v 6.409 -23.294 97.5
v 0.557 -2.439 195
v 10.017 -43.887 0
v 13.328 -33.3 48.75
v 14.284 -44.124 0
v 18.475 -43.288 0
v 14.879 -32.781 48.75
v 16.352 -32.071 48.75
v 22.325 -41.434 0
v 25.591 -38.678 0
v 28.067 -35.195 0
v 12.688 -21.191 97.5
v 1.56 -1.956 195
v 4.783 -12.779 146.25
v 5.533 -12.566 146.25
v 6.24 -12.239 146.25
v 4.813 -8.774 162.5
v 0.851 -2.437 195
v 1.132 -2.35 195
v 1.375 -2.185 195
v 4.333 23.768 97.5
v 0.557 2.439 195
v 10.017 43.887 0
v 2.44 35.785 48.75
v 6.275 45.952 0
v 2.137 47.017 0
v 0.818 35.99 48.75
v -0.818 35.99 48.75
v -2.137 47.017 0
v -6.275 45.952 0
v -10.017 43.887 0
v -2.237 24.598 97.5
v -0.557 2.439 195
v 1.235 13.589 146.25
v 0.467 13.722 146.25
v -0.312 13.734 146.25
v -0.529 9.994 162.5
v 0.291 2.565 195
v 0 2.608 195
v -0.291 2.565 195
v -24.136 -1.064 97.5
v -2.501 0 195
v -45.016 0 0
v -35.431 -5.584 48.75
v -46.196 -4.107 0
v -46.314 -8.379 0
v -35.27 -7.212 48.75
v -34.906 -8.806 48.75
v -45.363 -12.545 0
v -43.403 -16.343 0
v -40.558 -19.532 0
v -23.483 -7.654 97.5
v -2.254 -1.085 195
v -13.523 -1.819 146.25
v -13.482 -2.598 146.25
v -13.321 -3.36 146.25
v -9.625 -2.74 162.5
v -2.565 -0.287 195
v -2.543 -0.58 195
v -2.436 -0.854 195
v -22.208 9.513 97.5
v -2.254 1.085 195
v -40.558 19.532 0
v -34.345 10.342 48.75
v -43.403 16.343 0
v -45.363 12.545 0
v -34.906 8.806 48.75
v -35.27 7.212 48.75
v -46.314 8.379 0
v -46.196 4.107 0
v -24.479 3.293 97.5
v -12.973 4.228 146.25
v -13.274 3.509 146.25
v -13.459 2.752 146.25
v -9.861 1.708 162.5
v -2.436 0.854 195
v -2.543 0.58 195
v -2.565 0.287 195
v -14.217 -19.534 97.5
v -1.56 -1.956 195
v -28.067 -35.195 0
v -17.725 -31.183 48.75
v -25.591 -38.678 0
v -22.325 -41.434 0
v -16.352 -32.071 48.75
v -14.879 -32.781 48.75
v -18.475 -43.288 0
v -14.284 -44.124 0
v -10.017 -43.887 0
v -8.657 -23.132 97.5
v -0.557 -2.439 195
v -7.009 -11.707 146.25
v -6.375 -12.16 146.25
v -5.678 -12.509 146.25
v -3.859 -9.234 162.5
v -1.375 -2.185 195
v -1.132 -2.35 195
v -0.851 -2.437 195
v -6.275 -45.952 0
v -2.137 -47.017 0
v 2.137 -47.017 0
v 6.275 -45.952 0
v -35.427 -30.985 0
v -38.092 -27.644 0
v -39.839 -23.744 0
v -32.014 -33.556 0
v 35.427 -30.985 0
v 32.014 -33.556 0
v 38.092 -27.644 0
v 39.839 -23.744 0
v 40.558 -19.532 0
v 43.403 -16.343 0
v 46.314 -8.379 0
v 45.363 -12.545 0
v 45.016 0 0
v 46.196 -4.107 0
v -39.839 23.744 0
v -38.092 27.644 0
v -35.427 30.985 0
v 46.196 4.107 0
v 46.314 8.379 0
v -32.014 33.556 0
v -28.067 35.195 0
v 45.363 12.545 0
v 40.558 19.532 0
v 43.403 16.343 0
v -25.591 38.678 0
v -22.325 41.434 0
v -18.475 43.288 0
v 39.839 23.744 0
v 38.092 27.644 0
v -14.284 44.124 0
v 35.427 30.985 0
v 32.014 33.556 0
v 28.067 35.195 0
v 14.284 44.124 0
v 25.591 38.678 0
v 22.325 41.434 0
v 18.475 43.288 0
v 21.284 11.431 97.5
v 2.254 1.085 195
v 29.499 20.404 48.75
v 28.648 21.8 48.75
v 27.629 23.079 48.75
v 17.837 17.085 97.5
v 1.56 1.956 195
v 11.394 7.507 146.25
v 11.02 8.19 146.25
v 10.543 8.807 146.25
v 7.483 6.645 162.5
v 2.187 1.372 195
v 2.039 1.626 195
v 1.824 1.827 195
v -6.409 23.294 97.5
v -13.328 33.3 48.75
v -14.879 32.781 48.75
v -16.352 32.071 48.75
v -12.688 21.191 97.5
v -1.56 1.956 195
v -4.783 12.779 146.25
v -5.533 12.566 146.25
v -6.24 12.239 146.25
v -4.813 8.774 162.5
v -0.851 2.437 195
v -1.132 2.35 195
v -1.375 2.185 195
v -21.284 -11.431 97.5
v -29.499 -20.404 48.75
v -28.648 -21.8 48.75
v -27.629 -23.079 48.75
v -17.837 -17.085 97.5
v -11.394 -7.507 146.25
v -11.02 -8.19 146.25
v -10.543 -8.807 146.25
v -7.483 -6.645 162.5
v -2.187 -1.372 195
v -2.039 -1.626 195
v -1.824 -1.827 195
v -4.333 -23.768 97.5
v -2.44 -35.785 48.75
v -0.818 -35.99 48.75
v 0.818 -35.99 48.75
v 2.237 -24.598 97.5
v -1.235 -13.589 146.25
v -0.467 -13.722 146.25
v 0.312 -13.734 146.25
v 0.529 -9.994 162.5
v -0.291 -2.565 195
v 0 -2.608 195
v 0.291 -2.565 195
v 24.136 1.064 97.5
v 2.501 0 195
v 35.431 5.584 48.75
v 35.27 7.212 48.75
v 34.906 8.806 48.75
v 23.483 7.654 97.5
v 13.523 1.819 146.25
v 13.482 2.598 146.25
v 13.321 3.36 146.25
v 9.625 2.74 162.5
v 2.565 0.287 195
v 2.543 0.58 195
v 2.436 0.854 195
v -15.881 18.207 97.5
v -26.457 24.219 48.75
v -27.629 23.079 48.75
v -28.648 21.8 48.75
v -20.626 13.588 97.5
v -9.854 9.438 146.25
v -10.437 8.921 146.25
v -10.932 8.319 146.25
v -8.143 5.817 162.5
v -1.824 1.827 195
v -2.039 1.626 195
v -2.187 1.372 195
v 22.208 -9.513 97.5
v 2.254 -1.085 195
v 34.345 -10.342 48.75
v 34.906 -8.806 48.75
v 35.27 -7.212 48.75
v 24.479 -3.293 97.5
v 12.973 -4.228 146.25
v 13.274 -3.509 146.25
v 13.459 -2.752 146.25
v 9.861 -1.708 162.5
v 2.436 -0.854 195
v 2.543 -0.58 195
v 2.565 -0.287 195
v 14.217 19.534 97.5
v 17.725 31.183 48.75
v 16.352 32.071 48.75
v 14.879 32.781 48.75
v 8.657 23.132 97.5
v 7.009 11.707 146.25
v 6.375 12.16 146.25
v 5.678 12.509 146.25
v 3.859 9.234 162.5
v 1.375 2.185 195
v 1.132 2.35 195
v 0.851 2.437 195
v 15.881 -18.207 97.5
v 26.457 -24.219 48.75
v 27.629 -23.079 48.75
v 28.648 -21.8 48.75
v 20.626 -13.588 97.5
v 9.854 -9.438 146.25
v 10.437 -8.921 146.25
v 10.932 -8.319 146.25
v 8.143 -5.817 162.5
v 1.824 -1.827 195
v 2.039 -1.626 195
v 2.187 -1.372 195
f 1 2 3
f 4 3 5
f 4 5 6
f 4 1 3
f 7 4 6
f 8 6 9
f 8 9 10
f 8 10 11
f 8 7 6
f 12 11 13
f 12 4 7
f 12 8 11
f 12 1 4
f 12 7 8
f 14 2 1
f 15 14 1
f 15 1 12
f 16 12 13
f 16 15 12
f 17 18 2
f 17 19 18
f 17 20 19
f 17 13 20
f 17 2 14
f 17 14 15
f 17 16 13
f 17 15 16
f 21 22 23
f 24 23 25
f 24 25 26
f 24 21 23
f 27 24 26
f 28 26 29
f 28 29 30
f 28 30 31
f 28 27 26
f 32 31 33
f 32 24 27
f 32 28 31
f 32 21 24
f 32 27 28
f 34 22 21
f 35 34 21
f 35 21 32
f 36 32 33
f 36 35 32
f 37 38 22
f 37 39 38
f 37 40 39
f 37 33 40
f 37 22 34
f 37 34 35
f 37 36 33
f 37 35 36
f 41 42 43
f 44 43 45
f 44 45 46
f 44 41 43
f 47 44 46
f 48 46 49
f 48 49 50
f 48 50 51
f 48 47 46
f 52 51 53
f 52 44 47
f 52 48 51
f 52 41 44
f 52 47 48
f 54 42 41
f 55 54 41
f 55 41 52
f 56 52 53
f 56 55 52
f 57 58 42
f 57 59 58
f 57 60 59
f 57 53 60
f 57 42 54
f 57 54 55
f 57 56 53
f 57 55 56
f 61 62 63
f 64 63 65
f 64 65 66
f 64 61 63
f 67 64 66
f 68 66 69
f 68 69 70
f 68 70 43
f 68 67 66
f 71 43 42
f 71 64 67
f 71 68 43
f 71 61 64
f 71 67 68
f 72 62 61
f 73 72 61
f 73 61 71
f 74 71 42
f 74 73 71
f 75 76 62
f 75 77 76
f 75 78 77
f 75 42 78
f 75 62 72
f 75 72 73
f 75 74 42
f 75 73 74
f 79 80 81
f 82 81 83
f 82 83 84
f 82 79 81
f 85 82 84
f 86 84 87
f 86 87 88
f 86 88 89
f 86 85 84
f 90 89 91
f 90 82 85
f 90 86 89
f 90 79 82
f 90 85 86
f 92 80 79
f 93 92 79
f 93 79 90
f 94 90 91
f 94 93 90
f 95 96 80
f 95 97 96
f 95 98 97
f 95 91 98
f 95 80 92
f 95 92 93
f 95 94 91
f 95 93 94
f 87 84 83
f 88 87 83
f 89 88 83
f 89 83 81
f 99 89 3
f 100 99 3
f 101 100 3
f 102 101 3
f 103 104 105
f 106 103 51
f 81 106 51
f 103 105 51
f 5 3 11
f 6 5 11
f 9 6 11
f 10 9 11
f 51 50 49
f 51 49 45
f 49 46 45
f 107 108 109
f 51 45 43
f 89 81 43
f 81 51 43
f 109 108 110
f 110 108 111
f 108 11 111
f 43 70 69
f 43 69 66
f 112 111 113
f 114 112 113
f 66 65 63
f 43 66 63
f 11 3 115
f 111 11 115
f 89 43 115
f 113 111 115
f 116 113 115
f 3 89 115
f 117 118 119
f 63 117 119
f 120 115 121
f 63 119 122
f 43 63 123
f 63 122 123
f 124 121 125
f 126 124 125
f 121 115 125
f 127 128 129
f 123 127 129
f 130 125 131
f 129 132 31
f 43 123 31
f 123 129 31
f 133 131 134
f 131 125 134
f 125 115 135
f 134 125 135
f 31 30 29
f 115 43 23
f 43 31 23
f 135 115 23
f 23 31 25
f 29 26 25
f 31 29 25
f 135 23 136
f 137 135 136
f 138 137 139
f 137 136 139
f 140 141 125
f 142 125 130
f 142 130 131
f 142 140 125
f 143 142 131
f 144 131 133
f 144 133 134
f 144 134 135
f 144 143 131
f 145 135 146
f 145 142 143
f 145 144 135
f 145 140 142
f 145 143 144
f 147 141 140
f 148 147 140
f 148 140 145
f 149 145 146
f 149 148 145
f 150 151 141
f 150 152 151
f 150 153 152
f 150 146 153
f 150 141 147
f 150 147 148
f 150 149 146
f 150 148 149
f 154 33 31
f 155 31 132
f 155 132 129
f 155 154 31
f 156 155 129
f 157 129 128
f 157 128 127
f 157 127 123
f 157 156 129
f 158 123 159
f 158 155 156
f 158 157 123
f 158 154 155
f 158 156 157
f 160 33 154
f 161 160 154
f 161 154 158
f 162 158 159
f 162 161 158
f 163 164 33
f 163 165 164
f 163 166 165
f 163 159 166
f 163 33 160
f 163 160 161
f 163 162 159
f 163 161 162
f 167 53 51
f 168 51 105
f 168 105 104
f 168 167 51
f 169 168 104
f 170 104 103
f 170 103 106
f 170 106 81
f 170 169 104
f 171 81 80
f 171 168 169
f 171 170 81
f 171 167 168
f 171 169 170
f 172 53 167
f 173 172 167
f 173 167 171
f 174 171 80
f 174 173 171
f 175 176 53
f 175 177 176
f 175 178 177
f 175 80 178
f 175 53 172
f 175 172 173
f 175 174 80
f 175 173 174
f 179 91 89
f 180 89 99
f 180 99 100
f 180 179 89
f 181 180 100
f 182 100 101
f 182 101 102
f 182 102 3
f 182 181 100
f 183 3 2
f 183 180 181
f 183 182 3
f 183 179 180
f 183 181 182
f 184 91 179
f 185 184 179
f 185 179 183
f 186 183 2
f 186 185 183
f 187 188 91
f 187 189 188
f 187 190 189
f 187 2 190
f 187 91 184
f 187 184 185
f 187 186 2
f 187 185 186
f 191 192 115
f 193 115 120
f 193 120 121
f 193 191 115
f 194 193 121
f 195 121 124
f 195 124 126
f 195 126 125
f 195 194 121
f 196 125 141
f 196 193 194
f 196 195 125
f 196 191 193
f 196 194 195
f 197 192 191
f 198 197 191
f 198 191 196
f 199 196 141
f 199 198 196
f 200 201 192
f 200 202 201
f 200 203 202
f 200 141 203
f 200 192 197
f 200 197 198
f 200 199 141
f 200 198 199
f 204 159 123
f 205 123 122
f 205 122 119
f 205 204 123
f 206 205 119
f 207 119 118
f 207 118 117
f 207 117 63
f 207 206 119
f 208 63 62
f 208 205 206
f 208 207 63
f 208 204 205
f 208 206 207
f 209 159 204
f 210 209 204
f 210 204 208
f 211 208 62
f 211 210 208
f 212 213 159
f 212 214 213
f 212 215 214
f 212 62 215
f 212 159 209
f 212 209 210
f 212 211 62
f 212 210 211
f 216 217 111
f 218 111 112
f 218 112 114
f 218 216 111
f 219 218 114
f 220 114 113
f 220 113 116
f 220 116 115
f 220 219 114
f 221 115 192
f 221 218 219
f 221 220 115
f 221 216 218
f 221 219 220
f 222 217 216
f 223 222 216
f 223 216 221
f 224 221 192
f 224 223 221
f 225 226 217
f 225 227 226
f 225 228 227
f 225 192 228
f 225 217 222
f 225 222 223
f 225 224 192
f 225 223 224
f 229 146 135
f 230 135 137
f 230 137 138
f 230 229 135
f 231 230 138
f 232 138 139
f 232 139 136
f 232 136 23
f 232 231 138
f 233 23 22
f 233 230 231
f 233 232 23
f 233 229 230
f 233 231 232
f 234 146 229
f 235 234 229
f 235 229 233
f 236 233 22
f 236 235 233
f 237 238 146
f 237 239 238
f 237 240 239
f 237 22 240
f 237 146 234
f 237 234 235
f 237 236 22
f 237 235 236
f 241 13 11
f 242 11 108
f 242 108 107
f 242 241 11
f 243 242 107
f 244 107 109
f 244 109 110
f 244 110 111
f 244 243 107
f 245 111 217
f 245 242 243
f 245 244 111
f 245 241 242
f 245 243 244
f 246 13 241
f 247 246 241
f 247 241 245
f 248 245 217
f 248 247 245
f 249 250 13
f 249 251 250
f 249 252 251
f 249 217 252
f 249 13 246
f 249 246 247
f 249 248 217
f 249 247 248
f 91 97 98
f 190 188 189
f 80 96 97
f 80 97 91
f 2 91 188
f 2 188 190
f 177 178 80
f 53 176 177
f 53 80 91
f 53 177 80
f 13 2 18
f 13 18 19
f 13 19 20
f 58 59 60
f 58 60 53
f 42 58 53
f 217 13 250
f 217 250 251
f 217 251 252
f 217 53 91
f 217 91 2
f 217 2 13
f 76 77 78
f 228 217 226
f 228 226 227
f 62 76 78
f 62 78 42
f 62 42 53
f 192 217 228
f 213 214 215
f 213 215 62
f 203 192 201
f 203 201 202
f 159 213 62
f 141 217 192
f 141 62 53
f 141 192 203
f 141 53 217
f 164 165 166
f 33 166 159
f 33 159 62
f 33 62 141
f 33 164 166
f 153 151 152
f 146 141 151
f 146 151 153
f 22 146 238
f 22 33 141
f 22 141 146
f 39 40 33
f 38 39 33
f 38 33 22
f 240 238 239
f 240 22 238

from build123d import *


with BuildPart() as f3:
    # F0 (on Top) → F3 section 0
    with BuildSketch(Plane.XY):
        with BuildLine():
            ThreePointArc((28.067108, 35.195041), (20.458563, 42.482644), (10.017035, 43.887498))
            ThreePointArc((10.017035, 43.887498), (0, 47.152178), (-10.017035, 43.887498))
            ThreePointArc((-10.017035, 43.887498), (-20.458563, 42.482644), (-28.067108, 35.195041))
            ThreePointArc((-28.067108, 35.195041), (-36.865057, 29.398902), (-40.558147, 19.531774))
            ThreePointArc((-40.558147, 19.531774), (-45.969974, 10.492347), (-45.016146, 0))
            ThreePointArc((-45.016146, 0), (-45.969974, -10.492347), (-40.558147, -19.531774))
            ThreePointArc((-40.558147, -19.531774), (-36.865057, -29.398902), (-28.067108, -35.195041))
            ThreePointArc((-28.067108, -35.195041), (-20.458563, -42.482644), (-10.017035, -43.887498))
            ThreePointArc((-10.017035, -43.887498), (0, -47.152178), (10.017035, -43.887498))
            ThreePointArc((10.017035, -43.887498), (20.458563, -42.482644), (28.067108, -35.195041))
            ThreePointArc((28.067108, -35.195041), (36.865057, -29.398902), (40.558147, -19.531774))
            ThreePointArc((40.558147, -19.531774), (45.969974, -10.492347), (45.016146, 0))
            ThreePointArc((45.016146, 0), (45.969974, 10.492347), (40.558147, 19.531774))
            ThreePointArc((40.558147, 19.531774), (36.865057, 29.398902), (28.067108, 35.195041))
        make_face()
    # F2 (on offset) → F3 section 1
    with BuildSketch(Plane.XY.offset(195)):
        with BuildLine():
            ThreePointArc((1.559635, 1.95572), (1.13156, 2.349709), (0.556627, 2.438743))
            ThreePointArc((0.556627, 2.438743), (0, 2.60798), (-0.556627, 2.438743))
            ThreePointArc((-0.556627, 2.438743), (-1.13156, 2.349709), (-1.559635, 1.95572))
            ThreePointArc((-1.559635, 1.95572), (-2.039001, 1.626049), (-2.253737, 1.085343))
            ThreePointArc((-2.253737, 1.085343), (-2.542593, 0.58033), (-2.50146, 0))
            ThreePointArc((-2.50146, 0), (-2.542593, -0.58033), (-2.253737, -1.085343))
            ThreePointArc((-2.253737, -1.085343), (-2.039001, -1.626049), (-1.559635, -1.95572))
            ThreePointArc((-1.559635, -1.95572), (-1.13156, -2.349709), (-0.556627, -2.438743))
            ThreePointArc((-0.556627, -2.438743), (0, -2.60798), (0.556627, -2.438743))
            ThreePointArc((0.556627, -2.438743), (1.13156, -2.349709), (1.559635, -1.95572))
            ThreePointArc((1.559635, -1.95572), (2.039001, -1.626049), (2.253737, -1.085343))
            ThreePointArc((2.253737, -1.085343), (2.542593, -0.58033), (2.50146, 0))
            ThreePointArc((2.50146, 0), (2.542593, 0.58033), (2.253737, 1.085343))
            ThreePointArc((2.253737, 1.085343), (2.039001, 1.626049), (1.559635, 1.95572))
        make_face()
    loft()


solid = f3.part
